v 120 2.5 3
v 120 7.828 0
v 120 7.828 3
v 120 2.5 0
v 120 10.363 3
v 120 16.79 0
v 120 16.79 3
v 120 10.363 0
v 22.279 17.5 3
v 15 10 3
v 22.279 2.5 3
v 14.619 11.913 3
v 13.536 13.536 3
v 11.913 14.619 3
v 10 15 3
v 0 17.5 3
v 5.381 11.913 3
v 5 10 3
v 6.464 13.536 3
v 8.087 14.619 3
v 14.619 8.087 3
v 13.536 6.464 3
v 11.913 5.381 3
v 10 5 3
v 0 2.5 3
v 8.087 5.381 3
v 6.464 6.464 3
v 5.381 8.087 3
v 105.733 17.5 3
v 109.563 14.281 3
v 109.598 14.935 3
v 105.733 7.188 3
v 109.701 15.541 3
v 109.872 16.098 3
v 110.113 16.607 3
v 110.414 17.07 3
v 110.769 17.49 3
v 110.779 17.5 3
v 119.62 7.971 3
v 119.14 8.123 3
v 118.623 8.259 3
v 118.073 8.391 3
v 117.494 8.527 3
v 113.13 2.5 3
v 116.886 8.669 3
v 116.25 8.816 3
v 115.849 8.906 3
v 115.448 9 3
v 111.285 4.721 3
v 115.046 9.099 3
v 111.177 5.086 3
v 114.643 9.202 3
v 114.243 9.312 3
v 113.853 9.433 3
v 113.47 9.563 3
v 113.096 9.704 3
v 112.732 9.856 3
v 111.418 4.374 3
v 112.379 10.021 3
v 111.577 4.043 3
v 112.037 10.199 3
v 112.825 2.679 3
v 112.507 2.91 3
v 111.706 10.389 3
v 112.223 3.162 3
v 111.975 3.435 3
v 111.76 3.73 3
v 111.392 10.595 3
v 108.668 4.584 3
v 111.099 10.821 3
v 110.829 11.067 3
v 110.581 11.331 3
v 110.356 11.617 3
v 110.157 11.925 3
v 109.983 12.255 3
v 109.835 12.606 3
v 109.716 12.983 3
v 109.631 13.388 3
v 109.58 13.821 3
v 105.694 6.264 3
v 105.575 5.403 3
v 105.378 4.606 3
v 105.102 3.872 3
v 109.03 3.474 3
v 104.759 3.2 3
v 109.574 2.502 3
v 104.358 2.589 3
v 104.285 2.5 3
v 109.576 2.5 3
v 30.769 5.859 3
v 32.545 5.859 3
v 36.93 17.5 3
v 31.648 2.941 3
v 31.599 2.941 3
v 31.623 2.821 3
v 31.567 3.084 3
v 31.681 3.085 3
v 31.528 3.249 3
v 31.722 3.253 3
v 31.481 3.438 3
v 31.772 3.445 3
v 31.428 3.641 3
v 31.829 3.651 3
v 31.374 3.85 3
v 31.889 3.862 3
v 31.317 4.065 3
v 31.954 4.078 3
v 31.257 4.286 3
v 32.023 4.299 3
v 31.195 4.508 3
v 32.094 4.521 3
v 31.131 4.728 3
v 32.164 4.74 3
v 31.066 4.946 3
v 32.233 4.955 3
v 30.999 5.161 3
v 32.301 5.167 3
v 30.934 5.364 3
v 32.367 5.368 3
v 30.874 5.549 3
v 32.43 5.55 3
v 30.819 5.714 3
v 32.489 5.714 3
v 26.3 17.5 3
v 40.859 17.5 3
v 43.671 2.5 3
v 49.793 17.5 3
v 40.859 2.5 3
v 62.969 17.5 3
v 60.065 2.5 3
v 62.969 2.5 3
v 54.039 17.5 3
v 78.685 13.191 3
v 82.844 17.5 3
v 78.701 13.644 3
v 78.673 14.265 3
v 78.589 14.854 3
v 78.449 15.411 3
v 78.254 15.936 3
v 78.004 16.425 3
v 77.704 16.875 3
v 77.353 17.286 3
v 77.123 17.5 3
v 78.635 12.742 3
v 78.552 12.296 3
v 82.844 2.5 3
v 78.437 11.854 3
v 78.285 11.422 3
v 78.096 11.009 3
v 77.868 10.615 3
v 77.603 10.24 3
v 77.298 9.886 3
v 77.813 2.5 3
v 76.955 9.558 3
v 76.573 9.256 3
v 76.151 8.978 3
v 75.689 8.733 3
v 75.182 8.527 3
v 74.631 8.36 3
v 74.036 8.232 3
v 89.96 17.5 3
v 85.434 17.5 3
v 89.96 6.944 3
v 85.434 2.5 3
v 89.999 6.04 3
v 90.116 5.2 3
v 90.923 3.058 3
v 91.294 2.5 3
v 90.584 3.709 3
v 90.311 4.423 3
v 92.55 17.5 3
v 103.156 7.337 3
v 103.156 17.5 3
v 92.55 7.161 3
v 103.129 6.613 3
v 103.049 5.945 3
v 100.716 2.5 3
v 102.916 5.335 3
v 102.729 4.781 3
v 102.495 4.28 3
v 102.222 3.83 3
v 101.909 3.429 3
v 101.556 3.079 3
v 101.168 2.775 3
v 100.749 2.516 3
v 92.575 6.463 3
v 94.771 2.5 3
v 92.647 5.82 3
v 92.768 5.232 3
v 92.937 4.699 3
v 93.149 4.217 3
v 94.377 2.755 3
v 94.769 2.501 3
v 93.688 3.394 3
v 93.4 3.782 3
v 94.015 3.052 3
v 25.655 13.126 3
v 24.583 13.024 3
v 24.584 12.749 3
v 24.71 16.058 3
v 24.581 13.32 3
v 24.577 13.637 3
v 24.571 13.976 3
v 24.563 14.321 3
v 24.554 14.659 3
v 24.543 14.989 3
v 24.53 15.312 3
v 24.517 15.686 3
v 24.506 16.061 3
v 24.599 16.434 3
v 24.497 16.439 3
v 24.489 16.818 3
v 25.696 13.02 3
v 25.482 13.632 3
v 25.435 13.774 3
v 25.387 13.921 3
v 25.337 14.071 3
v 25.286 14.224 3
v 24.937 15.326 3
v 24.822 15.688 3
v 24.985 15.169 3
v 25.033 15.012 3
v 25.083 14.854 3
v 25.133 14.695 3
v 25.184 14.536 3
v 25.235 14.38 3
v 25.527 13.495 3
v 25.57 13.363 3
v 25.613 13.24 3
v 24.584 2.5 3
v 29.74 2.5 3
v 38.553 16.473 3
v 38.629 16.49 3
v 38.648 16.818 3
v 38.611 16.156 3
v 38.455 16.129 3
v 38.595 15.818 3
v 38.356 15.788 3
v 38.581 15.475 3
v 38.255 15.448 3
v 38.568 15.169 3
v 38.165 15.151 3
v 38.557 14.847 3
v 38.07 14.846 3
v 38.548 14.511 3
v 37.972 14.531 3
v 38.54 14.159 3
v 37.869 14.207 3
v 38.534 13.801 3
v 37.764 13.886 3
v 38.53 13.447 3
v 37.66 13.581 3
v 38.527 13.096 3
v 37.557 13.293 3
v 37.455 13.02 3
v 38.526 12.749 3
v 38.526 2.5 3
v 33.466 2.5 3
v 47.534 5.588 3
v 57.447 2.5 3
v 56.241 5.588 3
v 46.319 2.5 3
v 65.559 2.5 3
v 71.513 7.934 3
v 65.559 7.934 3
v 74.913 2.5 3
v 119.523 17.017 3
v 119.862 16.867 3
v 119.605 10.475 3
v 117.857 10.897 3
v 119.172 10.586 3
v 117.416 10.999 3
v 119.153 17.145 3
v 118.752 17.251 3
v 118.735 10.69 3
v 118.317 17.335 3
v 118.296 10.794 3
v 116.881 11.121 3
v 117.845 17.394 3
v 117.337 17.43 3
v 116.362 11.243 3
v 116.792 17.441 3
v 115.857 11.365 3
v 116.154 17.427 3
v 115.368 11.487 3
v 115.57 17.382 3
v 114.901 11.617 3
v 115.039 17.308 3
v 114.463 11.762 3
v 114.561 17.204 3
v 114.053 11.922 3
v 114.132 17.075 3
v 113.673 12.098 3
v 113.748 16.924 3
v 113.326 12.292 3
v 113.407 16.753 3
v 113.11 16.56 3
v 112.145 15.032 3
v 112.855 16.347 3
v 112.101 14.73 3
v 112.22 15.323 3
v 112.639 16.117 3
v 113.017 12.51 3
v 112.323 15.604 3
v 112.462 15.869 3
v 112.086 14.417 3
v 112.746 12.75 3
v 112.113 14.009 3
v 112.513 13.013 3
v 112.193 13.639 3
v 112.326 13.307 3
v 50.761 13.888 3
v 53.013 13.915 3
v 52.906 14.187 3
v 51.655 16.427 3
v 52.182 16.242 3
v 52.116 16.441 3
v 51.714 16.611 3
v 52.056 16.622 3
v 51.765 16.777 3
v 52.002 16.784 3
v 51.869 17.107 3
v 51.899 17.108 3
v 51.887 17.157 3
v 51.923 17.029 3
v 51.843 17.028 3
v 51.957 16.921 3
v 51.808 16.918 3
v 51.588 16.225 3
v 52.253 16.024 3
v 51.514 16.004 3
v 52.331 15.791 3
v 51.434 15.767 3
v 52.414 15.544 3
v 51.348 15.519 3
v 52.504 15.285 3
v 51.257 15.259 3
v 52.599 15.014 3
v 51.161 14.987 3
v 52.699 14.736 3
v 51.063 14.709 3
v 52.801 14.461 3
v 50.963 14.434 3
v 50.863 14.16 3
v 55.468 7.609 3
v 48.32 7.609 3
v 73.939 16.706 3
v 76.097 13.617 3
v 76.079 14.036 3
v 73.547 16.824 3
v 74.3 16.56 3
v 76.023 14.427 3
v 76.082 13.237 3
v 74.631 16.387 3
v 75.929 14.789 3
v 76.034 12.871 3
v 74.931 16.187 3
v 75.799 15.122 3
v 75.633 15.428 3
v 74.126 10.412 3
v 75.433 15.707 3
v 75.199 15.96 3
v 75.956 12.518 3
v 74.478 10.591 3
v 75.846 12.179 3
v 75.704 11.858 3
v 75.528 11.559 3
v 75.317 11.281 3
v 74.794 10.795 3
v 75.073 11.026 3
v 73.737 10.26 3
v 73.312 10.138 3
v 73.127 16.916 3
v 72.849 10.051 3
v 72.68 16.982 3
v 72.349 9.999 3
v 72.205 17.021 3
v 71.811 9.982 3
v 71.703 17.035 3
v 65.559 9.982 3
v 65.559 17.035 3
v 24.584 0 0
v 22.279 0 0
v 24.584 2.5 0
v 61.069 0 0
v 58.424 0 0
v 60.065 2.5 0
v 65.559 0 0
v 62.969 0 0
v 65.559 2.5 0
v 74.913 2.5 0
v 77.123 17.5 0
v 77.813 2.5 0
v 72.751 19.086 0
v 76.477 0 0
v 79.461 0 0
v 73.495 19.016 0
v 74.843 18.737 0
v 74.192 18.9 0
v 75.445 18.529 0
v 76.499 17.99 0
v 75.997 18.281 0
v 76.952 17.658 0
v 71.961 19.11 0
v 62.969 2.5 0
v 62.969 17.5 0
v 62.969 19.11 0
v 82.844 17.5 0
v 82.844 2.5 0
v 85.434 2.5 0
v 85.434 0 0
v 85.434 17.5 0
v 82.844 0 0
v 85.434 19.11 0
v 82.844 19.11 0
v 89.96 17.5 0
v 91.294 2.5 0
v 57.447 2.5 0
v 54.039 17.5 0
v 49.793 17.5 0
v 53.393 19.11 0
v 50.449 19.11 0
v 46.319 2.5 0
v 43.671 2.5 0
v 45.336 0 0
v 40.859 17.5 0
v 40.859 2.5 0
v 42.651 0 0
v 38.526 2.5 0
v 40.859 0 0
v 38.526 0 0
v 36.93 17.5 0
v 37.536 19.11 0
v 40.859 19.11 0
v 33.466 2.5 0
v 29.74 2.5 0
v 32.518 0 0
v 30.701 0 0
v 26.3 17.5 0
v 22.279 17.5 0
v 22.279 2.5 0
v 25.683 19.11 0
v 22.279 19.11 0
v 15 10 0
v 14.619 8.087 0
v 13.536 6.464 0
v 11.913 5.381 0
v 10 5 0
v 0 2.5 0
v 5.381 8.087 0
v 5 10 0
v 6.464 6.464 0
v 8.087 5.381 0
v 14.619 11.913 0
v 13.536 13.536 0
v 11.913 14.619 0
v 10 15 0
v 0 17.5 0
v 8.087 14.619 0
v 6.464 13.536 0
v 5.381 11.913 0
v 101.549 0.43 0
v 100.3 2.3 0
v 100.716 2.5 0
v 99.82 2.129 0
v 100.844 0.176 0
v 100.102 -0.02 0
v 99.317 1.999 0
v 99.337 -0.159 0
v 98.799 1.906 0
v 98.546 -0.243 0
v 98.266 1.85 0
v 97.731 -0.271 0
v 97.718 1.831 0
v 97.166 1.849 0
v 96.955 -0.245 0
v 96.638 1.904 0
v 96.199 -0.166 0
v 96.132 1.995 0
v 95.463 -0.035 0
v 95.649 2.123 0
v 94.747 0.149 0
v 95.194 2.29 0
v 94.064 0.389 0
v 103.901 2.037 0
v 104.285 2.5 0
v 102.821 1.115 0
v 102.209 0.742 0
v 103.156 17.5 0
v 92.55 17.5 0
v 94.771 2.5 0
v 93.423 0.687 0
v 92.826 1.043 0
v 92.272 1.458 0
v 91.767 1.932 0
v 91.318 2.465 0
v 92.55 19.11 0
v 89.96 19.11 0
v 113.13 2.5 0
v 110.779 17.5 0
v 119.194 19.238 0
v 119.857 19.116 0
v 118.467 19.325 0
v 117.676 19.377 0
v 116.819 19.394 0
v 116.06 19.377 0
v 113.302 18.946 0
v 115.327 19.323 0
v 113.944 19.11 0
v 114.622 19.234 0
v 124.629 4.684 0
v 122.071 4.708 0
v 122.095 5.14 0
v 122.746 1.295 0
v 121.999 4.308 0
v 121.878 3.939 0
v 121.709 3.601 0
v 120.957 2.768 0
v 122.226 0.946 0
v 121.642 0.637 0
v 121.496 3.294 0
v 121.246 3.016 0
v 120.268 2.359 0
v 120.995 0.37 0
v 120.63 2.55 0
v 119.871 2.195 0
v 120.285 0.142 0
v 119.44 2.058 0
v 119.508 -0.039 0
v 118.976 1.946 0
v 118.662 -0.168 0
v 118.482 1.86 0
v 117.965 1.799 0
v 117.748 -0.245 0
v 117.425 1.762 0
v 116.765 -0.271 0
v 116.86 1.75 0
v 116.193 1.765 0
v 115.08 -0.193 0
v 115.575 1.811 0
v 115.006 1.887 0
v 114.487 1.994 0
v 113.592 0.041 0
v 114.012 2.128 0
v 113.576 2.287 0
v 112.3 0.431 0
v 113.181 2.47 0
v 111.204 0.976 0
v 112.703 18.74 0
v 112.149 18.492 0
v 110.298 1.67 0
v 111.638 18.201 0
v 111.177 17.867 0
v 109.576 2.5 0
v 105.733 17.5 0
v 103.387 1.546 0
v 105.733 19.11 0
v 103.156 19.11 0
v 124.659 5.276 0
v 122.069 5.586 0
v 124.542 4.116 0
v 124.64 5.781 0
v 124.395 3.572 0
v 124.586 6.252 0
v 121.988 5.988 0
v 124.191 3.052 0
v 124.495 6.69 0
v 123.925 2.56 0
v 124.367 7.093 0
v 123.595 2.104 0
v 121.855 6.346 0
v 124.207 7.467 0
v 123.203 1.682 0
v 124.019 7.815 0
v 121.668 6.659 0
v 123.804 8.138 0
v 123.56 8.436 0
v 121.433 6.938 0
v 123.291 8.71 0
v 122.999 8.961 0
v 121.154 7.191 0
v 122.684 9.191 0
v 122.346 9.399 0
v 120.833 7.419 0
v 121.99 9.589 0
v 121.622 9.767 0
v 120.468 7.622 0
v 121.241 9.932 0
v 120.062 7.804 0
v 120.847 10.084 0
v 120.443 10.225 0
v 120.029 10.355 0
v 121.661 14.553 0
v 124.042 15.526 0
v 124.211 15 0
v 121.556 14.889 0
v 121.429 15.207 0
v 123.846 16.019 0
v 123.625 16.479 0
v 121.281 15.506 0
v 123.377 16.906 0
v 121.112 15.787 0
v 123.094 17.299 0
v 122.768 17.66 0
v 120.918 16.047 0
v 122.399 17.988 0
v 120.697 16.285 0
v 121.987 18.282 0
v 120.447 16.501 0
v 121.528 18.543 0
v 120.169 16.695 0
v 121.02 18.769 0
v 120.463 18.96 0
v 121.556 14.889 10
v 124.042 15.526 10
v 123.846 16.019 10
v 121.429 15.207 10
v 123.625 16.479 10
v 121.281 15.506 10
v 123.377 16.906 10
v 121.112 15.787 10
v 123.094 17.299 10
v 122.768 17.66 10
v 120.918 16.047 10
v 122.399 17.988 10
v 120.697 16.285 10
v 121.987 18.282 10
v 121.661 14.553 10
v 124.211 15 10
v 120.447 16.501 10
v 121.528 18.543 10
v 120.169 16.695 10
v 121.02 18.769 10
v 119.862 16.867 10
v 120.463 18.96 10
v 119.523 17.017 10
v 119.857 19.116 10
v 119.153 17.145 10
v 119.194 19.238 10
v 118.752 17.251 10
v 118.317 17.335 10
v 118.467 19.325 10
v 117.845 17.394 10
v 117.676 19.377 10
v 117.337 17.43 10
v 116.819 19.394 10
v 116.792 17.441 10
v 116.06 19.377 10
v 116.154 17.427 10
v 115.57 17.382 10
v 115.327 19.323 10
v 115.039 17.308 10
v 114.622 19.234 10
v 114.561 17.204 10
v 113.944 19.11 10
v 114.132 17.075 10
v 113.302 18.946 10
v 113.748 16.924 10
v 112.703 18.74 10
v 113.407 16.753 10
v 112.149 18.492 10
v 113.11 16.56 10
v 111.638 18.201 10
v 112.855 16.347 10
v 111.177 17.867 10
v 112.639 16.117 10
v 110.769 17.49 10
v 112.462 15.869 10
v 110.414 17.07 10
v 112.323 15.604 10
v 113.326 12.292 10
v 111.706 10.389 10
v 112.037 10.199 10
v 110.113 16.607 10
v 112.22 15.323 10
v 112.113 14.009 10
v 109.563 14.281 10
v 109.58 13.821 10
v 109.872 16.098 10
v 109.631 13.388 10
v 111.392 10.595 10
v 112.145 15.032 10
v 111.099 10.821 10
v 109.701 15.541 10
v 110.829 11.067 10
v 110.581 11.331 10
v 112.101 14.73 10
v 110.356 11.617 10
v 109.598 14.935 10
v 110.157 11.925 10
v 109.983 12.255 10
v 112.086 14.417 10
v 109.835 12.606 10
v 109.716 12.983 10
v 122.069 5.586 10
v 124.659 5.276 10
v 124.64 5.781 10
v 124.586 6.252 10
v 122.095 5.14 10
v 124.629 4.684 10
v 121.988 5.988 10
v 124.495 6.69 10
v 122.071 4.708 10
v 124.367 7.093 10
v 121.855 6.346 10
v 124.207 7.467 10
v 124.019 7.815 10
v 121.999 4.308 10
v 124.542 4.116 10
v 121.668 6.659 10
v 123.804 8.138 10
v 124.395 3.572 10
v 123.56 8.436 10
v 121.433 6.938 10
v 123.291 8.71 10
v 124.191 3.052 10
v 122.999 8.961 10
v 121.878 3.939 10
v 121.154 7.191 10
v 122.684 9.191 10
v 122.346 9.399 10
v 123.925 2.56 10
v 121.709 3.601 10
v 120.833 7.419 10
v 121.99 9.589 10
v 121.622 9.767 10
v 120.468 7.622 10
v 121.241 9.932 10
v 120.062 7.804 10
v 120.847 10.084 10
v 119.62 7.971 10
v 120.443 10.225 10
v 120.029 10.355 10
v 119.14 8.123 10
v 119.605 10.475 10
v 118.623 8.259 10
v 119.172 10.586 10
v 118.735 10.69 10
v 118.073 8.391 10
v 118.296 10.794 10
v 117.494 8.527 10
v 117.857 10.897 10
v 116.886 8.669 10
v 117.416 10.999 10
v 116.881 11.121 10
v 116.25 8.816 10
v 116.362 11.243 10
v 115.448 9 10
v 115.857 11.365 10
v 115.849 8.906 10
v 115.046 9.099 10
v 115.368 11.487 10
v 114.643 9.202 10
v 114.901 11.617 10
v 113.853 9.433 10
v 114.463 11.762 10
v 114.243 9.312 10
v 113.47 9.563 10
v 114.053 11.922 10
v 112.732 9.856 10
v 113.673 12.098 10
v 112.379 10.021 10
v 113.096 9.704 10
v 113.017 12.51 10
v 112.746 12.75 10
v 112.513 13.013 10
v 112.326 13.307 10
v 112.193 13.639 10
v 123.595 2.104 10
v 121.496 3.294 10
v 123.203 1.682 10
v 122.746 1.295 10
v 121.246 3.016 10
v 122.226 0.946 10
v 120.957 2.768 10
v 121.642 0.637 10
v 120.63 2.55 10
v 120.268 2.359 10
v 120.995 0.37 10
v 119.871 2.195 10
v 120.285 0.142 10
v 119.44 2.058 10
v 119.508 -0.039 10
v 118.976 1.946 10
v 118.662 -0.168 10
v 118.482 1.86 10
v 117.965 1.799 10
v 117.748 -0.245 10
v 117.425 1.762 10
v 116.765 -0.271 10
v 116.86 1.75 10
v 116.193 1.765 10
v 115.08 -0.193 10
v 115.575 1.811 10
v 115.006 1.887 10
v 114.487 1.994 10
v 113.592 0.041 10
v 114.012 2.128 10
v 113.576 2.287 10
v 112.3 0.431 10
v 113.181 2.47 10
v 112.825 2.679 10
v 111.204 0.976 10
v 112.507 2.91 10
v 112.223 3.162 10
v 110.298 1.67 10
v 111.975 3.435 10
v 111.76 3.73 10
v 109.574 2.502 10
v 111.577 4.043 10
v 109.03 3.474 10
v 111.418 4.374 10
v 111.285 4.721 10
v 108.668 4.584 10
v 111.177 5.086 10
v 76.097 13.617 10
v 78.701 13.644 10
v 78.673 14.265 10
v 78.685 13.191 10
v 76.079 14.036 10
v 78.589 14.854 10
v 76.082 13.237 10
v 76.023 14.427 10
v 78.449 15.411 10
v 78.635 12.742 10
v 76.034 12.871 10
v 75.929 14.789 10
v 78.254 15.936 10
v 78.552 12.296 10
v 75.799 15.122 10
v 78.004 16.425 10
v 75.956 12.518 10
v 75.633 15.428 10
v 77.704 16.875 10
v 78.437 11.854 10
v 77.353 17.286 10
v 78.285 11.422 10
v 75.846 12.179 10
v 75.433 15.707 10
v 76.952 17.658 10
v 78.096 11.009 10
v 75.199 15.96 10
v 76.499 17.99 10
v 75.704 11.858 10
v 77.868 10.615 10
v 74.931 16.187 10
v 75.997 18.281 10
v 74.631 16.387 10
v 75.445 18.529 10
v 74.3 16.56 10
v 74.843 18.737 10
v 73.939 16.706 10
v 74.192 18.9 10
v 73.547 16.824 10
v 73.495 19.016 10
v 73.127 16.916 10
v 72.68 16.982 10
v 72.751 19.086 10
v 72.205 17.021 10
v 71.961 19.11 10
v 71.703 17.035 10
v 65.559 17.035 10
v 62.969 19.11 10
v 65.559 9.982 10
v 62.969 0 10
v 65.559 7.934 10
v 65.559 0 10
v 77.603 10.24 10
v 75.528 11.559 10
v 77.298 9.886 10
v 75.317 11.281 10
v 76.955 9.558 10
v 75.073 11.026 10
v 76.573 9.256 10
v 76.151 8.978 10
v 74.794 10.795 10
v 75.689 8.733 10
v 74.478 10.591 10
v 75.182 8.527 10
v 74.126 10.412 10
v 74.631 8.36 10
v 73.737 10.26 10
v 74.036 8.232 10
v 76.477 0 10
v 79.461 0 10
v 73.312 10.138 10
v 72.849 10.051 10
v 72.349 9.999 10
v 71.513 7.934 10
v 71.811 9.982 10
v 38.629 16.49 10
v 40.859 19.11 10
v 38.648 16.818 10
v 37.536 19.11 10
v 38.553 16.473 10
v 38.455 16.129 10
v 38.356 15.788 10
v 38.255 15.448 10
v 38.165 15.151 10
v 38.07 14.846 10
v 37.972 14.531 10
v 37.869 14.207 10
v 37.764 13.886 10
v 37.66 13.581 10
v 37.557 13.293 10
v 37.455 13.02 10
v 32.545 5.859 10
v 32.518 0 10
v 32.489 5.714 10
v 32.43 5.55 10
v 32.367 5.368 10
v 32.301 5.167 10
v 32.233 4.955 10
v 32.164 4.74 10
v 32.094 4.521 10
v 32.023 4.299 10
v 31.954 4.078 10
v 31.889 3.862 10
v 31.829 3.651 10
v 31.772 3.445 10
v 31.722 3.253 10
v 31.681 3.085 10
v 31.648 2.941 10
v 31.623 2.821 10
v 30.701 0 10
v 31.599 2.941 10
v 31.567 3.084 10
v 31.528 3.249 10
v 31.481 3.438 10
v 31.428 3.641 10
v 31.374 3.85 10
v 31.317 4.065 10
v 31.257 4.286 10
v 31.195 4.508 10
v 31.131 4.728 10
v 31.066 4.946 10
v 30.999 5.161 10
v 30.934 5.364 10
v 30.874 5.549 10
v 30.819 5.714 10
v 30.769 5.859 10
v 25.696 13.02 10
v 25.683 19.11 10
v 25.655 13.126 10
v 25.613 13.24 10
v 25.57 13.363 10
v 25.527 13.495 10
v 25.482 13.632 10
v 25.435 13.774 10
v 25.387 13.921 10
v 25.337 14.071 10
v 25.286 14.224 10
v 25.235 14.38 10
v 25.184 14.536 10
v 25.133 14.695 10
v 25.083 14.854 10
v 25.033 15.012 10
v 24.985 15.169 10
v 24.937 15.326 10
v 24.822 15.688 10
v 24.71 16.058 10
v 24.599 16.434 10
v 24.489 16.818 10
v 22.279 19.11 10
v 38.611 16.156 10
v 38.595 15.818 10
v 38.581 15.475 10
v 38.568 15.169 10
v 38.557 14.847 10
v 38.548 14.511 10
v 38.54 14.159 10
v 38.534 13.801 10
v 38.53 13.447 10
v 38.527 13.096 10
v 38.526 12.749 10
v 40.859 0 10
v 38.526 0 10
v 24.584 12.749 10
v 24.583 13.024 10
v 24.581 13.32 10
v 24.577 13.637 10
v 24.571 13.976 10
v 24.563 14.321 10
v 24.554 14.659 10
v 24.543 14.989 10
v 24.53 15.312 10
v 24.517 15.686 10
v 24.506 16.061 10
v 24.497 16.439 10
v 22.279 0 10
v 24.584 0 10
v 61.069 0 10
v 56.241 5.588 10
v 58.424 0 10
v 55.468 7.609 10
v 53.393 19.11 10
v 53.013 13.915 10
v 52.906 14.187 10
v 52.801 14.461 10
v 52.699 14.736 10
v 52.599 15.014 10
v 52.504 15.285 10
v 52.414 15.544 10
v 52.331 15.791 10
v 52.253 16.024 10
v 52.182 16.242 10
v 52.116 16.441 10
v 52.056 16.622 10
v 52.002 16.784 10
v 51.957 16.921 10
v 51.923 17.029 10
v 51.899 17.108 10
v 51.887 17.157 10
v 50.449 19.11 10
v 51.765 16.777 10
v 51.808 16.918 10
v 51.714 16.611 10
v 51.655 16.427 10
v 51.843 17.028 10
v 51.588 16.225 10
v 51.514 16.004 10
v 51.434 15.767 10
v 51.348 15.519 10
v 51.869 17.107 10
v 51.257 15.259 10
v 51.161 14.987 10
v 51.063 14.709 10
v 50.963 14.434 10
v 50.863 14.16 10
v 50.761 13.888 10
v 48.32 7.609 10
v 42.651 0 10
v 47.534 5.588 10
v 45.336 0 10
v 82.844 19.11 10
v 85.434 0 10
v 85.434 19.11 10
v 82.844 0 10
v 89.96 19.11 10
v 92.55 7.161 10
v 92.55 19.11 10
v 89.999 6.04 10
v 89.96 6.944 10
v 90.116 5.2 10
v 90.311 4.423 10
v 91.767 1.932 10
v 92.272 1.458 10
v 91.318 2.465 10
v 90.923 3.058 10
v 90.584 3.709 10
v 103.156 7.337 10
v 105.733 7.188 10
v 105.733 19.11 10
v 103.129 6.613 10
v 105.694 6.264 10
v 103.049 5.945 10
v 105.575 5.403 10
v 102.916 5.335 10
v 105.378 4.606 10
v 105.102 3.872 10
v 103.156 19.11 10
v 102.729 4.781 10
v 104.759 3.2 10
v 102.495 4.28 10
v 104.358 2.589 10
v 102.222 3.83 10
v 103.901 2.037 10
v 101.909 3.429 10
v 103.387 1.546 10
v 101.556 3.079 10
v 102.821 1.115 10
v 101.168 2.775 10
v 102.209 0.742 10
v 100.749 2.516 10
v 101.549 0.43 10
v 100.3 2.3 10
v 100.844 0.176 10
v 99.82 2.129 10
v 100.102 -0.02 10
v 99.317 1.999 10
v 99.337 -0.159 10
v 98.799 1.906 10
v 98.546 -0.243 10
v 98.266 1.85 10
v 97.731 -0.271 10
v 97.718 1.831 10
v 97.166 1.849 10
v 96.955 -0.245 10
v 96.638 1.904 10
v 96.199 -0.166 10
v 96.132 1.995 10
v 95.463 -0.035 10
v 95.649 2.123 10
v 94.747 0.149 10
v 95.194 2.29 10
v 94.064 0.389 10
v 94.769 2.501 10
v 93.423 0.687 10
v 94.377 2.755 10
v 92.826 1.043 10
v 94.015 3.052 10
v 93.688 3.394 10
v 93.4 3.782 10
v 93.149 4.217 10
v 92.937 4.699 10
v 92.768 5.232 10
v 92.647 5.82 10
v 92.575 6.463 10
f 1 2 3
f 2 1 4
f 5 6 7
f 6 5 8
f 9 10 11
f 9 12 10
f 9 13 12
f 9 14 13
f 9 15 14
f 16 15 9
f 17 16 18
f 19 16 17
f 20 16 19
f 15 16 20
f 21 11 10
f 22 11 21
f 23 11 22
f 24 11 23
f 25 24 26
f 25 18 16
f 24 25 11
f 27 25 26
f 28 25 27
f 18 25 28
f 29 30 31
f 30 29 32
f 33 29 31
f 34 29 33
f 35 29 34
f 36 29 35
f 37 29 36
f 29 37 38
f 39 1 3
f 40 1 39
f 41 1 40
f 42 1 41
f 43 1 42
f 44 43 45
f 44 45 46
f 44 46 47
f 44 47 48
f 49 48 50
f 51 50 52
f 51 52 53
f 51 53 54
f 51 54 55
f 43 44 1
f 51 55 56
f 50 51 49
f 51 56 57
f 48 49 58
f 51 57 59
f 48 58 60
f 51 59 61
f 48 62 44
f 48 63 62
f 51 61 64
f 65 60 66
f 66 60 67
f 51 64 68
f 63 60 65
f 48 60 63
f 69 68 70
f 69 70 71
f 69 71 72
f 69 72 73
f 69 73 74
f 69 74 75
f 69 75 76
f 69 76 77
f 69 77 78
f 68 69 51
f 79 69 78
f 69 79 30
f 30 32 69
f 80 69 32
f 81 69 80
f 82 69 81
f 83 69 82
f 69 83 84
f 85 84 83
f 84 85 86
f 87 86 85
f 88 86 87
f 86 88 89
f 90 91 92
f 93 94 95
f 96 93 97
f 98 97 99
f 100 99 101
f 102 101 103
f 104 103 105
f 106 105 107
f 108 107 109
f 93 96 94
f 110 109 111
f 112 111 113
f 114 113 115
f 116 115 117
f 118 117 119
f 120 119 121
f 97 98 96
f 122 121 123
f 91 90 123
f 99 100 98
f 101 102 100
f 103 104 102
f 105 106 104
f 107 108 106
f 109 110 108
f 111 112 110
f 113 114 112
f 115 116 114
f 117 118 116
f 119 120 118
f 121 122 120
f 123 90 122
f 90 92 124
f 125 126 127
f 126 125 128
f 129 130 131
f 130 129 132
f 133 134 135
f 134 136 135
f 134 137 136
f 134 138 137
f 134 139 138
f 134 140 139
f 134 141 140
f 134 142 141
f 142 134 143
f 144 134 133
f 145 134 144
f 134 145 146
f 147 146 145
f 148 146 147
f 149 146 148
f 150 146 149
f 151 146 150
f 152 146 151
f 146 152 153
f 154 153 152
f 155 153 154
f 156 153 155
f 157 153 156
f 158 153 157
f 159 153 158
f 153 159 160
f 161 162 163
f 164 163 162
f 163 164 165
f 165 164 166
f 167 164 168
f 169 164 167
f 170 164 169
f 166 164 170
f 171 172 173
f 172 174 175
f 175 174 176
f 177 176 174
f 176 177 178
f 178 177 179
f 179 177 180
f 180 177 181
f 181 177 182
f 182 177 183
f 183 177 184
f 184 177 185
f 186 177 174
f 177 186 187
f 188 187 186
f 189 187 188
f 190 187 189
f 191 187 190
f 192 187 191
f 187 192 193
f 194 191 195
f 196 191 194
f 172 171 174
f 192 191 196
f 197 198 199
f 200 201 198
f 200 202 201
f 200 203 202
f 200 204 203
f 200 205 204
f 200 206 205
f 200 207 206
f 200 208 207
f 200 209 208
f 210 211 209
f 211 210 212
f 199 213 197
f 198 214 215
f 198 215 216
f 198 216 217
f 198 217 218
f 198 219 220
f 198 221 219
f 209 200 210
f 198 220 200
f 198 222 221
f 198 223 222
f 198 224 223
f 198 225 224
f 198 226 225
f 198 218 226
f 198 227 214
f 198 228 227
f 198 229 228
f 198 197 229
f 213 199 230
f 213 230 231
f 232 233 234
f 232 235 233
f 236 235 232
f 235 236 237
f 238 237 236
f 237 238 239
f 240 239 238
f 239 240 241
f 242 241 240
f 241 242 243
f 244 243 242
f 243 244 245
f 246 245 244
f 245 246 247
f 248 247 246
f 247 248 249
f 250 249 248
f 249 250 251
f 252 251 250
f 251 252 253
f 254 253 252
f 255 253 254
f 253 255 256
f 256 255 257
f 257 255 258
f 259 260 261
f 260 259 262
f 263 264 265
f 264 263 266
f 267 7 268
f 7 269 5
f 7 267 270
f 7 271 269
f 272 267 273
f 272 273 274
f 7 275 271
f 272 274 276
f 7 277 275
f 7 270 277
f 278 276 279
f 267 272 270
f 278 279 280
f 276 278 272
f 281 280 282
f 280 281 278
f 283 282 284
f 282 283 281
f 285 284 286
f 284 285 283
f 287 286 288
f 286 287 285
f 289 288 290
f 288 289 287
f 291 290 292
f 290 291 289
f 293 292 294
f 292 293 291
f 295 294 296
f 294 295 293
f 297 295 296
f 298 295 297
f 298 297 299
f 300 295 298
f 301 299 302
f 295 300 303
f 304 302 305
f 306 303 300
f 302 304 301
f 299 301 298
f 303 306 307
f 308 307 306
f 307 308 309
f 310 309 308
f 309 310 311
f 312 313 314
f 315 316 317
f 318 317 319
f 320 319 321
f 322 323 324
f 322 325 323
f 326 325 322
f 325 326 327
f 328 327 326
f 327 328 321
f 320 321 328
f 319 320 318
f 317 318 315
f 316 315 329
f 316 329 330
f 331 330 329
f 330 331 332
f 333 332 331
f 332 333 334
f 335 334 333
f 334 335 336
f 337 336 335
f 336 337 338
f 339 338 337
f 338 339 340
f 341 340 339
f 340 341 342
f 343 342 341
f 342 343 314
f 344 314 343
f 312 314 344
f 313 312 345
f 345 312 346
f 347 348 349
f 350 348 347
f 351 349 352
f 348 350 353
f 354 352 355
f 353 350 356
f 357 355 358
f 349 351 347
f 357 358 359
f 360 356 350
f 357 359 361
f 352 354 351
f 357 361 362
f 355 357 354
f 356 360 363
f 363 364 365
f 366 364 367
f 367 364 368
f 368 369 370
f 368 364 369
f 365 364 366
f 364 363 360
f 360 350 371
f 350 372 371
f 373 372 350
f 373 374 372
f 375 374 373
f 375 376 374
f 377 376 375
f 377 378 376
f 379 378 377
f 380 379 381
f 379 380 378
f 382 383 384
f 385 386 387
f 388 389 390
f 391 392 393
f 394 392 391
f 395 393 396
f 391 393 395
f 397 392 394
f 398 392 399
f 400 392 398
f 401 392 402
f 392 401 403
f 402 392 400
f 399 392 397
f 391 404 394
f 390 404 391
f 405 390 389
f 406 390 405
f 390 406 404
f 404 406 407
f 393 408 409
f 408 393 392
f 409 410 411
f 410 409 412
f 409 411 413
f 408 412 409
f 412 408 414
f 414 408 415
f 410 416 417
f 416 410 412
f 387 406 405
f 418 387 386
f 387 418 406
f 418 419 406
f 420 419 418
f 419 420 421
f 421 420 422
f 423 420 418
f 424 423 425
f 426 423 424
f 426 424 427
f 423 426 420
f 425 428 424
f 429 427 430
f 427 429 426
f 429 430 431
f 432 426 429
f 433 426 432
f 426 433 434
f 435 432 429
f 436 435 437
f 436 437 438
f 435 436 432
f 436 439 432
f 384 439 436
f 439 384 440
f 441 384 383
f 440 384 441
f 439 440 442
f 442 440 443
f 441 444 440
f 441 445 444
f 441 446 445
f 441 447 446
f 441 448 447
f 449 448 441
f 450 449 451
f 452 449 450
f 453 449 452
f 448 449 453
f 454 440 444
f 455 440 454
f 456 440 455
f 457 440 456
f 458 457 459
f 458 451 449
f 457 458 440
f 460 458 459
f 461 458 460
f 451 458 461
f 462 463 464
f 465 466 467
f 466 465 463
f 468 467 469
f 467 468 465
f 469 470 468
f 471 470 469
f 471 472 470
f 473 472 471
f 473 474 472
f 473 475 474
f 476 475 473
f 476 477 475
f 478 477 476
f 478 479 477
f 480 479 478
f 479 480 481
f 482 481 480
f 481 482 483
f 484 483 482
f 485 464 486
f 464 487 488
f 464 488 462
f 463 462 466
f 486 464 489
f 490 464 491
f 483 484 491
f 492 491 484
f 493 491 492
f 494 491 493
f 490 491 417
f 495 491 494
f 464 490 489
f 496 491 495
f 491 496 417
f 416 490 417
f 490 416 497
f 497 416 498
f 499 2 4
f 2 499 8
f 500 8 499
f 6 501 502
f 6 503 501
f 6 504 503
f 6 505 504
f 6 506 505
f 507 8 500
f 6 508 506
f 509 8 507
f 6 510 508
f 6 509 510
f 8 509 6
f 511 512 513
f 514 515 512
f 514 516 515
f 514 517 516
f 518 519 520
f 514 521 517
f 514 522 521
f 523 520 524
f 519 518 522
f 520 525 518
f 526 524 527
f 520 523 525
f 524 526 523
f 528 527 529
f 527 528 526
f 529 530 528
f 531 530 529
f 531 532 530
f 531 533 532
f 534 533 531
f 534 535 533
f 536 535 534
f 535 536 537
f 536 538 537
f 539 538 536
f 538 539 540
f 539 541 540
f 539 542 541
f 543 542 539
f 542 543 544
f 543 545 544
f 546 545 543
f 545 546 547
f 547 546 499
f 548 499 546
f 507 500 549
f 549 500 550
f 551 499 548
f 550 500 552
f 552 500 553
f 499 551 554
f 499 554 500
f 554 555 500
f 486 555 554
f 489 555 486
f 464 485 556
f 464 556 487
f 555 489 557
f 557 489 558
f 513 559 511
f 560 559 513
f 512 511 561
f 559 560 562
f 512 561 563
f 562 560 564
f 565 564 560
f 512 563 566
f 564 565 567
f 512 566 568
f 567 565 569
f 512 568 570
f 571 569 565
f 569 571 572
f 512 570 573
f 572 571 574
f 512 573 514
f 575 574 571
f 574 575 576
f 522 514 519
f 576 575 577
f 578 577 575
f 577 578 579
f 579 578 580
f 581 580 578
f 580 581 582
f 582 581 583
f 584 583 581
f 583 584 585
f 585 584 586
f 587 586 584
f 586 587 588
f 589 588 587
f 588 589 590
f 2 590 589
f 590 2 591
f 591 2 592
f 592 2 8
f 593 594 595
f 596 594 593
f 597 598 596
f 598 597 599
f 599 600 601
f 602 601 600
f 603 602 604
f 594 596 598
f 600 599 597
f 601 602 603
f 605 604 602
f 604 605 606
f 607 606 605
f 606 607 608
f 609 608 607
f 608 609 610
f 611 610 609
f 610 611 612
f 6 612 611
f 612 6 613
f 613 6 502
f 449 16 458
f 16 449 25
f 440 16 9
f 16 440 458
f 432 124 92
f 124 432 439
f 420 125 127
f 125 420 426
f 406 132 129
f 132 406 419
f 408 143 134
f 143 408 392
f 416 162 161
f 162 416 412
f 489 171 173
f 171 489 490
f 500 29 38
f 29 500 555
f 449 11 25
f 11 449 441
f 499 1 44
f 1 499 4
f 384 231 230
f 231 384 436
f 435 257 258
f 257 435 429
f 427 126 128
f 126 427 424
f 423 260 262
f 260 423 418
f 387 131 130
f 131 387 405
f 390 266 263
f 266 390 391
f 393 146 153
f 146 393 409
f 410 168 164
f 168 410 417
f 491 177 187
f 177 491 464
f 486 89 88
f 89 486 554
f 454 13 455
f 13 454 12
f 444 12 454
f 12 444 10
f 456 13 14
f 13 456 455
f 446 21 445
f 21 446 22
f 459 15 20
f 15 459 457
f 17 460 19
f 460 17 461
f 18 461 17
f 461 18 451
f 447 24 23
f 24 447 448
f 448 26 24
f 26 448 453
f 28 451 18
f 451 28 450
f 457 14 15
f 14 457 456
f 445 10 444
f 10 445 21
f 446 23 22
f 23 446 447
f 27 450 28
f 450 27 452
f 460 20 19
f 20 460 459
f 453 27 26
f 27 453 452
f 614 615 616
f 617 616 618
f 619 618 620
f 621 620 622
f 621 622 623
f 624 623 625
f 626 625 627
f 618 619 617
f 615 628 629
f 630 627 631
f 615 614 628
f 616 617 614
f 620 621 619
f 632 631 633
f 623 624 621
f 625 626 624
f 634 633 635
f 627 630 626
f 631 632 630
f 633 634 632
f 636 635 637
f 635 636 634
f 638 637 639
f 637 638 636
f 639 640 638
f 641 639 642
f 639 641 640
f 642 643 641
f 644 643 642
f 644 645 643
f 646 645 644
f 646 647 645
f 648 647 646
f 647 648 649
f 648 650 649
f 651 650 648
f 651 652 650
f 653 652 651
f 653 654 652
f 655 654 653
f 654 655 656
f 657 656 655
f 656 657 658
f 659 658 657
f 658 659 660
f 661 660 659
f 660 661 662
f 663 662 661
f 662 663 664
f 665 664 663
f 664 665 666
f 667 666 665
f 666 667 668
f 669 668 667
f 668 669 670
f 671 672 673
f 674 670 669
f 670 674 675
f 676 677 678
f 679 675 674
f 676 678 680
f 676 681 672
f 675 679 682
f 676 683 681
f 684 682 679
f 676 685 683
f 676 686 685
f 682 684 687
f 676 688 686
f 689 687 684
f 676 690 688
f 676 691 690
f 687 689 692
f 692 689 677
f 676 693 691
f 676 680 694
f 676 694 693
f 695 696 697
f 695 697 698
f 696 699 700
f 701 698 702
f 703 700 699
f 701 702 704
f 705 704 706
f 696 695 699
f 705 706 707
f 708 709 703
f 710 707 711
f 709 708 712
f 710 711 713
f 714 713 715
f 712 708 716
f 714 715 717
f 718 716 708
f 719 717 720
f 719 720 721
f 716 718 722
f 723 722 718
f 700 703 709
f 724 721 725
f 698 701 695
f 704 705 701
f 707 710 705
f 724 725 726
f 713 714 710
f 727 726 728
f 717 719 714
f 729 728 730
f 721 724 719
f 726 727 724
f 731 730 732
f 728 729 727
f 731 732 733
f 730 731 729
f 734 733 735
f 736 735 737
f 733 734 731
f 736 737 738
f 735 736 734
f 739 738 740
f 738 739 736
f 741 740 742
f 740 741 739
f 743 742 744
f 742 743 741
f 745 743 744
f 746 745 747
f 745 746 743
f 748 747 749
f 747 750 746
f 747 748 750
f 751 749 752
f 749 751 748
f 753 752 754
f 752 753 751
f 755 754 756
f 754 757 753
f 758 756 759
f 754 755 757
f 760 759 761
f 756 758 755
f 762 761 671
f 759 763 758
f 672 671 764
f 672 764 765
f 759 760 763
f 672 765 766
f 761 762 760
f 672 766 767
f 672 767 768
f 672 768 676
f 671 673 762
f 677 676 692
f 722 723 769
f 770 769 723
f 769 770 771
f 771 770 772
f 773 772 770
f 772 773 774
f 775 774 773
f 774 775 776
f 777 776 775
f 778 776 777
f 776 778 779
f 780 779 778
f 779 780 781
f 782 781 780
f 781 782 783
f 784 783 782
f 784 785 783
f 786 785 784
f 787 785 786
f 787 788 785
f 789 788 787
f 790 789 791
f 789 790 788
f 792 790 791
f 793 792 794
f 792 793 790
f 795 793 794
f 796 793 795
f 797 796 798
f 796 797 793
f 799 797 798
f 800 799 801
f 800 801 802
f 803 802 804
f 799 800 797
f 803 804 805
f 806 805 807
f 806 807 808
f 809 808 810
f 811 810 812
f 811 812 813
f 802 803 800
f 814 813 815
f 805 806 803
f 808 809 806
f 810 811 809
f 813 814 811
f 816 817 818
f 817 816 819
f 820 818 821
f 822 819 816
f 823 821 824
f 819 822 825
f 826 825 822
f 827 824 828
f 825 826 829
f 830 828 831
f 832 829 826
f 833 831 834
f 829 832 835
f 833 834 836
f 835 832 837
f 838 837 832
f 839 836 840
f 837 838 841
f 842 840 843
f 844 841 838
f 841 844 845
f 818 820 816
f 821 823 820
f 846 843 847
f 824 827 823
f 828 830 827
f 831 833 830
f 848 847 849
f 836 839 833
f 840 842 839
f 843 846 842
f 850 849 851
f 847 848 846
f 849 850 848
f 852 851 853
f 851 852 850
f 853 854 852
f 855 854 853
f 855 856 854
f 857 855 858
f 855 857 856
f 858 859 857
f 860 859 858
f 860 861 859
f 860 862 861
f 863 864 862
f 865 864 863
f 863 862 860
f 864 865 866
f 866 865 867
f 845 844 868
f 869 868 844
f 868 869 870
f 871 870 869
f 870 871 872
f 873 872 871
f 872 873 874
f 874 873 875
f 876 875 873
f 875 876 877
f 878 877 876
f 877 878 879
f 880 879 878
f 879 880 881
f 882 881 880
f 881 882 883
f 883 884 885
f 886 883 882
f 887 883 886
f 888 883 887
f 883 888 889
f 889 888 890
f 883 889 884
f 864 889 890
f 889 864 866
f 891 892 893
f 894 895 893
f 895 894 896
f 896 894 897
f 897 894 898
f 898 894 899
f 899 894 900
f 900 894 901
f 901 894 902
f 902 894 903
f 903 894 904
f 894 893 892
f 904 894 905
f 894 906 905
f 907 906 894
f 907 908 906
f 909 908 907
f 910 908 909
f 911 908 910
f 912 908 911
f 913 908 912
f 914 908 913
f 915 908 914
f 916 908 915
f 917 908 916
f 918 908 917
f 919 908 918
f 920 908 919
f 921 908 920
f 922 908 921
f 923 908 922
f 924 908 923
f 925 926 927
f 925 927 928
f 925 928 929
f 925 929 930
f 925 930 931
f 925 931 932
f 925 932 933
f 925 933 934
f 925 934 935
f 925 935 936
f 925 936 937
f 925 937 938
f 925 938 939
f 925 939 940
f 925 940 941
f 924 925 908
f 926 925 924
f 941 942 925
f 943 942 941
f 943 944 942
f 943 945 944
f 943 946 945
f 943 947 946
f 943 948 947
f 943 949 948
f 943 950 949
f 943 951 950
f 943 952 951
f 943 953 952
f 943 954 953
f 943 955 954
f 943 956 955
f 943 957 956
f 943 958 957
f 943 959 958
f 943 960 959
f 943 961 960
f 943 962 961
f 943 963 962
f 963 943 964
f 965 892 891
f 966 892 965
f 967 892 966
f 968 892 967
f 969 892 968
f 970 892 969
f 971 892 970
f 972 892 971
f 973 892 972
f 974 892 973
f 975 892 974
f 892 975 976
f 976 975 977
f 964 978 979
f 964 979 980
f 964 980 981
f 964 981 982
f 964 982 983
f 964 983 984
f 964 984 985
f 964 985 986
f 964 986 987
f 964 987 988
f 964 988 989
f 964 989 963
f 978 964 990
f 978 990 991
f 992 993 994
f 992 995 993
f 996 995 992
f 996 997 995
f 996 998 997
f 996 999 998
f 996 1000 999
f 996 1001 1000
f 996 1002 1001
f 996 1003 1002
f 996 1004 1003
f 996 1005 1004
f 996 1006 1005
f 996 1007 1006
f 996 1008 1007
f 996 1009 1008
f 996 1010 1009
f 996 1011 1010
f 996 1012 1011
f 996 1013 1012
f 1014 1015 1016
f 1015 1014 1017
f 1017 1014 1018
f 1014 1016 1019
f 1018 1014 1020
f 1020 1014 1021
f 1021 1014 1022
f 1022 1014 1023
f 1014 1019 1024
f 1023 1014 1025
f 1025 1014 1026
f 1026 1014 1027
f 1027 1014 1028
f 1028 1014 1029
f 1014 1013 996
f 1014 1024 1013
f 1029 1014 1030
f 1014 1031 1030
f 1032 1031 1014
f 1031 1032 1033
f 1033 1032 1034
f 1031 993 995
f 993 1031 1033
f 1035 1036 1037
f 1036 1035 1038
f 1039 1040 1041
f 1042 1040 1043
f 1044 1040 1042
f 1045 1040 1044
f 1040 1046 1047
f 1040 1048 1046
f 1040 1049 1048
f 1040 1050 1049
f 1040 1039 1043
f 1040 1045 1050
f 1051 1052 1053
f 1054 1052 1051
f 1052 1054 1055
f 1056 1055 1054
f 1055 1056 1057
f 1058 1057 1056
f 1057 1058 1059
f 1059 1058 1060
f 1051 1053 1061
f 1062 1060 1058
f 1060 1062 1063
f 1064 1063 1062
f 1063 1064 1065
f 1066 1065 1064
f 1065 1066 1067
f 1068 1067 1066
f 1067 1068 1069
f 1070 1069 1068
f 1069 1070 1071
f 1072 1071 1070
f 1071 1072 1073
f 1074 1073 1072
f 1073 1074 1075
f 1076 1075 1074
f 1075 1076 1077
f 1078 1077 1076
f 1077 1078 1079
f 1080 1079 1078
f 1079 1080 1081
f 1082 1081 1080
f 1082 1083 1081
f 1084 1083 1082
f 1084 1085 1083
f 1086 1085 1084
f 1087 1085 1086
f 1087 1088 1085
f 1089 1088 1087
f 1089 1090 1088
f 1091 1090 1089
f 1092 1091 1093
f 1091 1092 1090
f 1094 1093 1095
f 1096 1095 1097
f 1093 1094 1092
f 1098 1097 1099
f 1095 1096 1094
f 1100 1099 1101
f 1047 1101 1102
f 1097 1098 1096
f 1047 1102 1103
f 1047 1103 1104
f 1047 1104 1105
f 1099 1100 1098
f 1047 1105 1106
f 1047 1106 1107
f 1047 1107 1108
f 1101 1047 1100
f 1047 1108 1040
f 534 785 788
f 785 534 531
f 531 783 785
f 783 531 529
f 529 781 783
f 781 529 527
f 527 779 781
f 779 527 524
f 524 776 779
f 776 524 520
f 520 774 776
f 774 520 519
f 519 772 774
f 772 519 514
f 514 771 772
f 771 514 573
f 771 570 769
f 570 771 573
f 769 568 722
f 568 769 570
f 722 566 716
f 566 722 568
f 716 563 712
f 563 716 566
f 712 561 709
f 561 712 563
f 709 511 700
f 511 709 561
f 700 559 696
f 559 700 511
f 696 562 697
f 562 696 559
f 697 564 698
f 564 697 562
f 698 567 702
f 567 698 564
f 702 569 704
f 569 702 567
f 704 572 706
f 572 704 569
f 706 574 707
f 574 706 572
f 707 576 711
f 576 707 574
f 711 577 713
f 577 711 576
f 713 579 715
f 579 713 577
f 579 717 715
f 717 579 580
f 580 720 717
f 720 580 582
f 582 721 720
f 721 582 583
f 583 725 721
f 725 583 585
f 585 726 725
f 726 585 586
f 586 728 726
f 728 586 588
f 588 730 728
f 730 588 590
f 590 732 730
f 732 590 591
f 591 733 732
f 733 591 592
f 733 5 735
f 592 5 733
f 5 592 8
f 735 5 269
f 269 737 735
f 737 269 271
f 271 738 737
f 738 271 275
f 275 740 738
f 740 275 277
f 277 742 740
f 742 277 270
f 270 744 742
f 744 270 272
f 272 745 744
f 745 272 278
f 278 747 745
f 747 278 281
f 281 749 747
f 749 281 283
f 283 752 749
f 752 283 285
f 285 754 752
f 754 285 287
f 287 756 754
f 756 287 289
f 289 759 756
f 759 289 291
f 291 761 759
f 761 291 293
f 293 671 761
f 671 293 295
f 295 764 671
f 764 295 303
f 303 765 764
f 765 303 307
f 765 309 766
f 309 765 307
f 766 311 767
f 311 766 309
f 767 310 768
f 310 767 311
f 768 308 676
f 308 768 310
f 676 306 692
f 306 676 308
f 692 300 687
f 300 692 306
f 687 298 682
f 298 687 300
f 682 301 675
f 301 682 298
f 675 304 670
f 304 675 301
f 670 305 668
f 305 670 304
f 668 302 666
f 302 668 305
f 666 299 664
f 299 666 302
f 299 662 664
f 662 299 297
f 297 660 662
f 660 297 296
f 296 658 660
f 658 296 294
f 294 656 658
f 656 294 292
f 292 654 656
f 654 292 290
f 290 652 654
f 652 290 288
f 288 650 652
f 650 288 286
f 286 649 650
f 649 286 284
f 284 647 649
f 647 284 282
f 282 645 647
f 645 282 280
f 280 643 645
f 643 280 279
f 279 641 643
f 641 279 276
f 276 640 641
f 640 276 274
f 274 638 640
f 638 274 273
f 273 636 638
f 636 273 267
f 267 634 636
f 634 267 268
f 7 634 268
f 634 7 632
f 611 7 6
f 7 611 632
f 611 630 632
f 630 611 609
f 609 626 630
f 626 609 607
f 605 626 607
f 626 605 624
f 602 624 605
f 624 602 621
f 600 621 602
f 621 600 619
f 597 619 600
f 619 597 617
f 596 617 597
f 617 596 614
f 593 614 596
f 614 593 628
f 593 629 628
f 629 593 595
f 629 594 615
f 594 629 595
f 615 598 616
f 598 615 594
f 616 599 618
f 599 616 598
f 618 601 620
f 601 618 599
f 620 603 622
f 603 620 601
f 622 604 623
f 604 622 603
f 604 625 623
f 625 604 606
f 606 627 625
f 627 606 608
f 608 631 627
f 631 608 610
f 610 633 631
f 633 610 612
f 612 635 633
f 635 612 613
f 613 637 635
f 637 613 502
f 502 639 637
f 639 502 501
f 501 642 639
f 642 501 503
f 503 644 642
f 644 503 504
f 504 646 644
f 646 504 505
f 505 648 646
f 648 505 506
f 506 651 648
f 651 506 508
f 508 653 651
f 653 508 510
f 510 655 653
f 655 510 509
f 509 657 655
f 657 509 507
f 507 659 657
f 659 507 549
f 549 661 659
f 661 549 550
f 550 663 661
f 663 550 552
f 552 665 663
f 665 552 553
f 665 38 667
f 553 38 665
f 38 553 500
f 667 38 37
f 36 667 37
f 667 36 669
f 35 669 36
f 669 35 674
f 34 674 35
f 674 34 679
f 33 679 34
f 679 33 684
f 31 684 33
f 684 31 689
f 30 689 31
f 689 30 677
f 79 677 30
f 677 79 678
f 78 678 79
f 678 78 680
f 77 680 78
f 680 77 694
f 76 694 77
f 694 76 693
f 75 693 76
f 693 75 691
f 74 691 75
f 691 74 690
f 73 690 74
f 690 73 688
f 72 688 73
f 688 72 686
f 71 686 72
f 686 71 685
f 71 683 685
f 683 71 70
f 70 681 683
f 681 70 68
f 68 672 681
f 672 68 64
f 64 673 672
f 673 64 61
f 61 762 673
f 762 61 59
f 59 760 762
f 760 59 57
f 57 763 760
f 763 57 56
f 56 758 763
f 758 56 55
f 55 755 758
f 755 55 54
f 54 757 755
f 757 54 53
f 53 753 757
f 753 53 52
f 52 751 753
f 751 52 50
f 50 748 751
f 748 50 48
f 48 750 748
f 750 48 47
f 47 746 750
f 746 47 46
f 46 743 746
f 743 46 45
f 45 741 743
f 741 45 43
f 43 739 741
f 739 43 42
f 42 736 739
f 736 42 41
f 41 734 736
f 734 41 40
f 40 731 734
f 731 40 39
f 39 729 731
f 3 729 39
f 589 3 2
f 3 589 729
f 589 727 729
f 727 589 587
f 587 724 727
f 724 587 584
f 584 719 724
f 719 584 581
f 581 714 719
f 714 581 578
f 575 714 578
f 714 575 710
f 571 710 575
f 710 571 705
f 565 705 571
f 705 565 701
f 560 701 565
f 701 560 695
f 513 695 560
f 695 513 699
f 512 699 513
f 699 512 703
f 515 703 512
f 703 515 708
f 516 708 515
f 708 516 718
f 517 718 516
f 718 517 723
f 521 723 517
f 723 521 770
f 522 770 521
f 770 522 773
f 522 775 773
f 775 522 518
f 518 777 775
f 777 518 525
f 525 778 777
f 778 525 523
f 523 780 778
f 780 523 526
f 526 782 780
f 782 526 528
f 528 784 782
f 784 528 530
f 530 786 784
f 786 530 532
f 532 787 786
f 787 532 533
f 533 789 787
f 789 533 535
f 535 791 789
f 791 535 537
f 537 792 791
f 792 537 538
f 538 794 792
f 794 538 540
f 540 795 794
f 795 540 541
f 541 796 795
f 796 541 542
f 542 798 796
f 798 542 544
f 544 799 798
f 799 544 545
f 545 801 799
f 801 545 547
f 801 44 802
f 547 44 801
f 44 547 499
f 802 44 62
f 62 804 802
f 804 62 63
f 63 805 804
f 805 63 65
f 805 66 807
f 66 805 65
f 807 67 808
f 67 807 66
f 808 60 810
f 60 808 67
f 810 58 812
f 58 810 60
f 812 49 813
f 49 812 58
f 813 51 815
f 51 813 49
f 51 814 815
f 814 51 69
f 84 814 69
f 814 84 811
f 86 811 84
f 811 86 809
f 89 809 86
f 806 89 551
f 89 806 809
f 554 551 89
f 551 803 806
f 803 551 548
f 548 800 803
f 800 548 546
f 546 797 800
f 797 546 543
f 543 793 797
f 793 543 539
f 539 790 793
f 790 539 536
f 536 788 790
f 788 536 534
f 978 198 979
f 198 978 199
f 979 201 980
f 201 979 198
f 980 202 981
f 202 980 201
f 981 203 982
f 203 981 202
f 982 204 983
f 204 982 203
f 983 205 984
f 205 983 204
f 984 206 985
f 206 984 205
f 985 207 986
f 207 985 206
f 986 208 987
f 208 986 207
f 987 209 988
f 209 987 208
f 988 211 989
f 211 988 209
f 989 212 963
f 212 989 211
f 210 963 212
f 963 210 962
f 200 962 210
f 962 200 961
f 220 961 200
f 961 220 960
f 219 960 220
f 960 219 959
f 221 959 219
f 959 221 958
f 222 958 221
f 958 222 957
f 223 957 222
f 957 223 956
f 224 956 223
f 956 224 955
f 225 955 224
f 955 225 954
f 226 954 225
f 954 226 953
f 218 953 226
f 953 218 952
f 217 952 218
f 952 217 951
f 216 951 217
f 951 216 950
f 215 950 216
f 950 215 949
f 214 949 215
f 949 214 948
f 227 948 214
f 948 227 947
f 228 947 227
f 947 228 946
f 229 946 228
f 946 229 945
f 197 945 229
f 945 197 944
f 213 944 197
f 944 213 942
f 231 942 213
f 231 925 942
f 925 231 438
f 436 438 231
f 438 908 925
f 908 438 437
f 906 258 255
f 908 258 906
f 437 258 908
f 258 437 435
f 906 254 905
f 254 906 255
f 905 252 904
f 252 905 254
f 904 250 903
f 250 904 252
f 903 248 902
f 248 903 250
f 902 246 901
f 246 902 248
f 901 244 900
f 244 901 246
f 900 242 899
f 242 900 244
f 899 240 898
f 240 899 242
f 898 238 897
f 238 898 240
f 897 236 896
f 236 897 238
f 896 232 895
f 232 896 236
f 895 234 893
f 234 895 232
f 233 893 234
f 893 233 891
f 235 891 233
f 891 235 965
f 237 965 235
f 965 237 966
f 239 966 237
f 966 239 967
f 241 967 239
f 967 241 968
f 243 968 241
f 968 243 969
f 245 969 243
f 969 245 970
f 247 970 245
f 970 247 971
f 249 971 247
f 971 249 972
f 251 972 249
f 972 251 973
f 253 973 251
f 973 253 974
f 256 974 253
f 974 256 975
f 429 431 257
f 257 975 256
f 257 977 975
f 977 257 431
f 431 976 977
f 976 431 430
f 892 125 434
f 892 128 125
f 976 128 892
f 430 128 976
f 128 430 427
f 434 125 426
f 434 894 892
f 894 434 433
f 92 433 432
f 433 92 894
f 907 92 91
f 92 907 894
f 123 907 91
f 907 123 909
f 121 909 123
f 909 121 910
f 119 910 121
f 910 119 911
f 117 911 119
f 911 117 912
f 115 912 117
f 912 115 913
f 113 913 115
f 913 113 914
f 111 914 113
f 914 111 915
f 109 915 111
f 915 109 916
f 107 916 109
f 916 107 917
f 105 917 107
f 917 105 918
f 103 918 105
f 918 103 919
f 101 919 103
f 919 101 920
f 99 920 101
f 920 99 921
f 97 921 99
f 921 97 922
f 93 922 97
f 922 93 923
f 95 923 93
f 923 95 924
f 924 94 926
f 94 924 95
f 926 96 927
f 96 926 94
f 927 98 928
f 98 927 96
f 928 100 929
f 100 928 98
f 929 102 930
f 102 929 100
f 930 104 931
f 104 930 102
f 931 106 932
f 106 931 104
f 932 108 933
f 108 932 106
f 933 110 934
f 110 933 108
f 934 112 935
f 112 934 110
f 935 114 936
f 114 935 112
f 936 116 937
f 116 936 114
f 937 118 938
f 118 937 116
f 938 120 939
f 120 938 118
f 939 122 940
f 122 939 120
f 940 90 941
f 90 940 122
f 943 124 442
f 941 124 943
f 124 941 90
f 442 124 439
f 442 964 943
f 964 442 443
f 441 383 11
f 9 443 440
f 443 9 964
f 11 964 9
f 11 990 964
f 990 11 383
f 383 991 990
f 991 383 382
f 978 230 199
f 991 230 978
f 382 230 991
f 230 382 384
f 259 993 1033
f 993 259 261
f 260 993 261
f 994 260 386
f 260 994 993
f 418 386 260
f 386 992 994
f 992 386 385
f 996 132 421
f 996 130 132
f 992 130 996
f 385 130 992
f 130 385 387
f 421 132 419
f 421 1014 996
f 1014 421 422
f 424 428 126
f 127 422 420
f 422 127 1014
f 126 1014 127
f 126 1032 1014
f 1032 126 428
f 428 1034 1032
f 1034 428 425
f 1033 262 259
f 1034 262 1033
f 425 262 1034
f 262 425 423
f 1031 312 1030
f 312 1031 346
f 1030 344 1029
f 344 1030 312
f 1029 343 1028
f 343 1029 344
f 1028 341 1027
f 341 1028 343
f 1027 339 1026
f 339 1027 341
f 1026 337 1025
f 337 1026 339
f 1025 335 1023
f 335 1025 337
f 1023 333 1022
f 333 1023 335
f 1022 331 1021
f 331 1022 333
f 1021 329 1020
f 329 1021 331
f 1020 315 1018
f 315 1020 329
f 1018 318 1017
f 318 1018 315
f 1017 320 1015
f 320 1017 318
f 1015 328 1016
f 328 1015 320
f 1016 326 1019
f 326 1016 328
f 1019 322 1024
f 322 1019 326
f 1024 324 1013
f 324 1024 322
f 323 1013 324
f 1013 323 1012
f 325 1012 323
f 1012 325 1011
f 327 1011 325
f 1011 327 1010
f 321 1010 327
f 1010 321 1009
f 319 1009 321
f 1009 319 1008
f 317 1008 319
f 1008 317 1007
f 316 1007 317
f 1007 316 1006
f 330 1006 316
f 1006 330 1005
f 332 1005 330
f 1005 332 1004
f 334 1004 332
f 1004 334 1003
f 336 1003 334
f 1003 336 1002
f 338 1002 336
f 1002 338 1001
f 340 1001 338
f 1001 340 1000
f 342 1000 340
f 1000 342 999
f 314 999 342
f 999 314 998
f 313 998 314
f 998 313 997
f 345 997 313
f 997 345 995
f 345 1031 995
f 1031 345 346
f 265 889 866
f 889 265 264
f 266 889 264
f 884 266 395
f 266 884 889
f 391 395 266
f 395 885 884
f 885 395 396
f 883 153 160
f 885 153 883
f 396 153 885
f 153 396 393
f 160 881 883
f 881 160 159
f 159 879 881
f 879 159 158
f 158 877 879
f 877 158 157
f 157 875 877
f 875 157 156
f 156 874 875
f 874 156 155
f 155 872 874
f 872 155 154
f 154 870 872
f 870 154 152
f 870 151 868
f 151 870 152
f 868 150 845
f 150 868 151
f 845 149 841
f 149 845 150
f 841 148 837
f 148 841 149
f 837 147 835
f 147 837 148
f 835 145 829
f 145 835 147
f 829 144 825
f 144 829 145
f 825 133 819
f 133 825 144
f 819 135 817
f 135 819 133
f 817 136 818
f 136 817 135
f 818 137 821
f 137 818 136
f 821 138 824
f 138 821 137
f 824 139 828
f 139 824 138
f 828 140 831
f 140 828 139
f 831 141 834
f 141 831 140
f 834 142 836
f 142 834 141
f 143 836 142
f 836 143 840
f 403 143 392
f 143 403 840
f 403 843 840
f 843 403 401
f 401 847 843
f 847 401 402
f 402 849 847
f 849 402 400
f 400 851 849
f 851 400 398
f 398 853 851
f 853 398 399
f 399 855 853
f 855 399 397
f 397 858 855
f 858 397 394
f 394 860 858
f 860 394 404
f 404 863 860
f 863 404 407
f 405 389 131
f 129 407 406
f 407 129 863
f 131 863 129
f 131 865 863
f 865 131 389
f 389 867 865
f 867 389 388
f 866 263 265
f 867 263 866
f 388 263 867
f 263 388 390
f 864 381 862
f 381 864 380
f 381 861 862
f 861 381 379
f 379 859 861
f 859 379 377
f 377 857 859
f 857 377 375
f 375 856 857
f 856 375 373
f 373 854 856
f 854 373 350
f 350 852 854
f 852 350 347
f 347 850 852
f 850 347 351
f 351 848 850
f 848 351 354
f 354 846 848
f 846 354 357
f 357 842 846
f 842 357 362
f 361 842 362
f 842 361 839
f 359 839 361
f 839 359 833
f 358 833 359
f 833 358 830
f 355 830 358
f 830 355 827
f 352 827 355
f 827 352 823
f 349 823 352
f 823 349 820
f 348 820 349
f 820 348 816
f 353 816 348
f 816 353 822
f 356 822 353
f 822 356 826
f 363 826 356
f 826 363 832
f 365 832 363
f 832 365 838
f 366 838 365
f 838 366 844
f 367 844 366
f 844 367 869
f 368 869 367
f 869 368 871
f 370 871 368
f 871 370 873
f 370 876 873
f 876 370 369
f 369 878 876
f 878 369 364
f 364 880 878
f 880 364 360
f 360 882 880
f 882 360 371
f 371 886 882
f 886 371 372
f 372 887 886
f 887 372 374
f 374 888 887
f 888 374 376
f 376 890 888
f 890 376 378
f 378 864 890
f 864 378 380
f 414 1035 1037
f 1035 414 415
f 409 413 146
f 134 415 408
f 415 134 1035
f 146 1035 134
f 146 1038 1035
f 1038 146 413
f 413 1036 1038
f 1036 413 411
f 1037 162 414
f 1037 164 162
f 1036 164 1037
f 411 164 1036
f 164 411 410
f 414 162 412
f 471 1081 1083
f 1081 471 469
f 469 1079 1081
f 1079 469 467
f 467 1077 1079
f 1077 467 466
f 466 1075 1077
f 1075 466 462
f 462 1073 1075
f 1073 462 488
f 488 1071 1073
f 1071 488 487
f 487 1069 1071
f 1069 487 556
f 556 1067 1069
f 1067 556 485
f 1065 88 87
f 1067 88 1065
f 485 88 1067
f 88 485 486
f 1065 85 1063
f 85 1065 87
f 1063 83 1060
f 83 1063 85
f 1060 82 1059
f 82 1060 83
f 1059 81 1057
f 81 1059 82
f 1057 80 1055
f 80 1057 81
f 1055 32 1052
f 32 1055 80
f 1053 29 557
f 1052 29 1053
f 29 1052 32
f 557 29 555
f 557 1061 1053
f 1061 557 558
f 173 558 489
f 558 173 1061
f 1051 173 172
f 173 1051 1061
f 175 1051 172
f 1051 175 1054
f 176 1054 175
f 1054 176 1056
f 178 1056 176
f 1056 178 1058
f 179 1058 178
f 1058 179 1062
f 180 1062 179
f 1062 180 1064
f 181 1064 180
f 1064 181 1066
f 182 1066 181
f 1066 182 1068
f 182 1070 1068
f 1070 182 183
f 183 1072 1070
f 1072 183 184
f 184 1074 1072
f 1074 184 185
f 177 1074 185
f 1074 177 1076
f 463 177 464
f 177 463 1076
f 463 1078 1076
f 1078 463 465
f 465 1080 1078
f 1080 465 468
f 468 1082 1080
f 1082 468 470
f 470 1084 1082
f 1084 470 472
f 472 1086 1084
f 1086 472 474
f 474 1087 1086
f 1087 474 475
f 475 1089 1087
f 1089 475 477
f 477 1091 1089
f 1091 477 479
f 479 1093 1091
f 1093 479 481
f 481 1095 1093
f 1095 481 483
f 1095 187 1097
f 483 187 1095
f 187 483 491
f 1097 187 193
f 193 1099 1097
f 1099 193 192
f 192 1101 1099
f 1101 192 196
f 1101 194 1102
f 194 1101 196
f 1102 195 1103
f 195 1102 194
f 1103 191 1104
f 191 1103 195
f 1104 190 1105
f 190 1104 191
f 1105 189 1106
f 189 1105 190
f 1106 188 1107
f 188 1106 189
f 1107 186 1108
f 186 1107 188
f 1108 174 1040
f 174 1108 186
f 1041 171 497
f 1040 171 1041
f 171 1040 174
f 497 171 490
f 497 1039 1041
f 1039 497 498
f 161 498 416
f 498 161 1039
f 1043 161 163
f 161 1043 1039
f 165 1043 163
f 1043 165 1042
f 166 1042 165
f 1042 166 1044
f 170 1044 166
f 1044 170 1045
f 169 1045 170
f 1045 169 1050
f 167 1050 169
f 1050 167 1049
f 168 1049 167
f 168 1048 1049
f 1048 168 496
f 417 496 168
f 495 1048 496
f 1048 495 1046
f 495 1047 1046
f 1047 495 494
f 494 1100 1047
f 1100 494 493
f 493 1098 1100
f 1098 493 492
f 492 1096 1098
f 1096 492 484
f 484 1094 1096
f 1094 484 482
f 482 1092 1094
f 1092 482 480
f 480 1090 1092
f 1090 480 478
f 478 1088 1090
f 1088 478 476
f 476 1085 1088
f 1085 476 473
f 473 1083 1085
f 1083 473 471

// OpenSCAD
translate([20, 0, 0]) {
    linear_extrude(height=10) {
        text("MARIUS", size=20);
    }
}

difference() {
    translate([0, 2.5, 0]) cube([120, 15, 3]);
    translate([10, 10, -1]) cylinder(h=20, r1=5, r2=5);
}
